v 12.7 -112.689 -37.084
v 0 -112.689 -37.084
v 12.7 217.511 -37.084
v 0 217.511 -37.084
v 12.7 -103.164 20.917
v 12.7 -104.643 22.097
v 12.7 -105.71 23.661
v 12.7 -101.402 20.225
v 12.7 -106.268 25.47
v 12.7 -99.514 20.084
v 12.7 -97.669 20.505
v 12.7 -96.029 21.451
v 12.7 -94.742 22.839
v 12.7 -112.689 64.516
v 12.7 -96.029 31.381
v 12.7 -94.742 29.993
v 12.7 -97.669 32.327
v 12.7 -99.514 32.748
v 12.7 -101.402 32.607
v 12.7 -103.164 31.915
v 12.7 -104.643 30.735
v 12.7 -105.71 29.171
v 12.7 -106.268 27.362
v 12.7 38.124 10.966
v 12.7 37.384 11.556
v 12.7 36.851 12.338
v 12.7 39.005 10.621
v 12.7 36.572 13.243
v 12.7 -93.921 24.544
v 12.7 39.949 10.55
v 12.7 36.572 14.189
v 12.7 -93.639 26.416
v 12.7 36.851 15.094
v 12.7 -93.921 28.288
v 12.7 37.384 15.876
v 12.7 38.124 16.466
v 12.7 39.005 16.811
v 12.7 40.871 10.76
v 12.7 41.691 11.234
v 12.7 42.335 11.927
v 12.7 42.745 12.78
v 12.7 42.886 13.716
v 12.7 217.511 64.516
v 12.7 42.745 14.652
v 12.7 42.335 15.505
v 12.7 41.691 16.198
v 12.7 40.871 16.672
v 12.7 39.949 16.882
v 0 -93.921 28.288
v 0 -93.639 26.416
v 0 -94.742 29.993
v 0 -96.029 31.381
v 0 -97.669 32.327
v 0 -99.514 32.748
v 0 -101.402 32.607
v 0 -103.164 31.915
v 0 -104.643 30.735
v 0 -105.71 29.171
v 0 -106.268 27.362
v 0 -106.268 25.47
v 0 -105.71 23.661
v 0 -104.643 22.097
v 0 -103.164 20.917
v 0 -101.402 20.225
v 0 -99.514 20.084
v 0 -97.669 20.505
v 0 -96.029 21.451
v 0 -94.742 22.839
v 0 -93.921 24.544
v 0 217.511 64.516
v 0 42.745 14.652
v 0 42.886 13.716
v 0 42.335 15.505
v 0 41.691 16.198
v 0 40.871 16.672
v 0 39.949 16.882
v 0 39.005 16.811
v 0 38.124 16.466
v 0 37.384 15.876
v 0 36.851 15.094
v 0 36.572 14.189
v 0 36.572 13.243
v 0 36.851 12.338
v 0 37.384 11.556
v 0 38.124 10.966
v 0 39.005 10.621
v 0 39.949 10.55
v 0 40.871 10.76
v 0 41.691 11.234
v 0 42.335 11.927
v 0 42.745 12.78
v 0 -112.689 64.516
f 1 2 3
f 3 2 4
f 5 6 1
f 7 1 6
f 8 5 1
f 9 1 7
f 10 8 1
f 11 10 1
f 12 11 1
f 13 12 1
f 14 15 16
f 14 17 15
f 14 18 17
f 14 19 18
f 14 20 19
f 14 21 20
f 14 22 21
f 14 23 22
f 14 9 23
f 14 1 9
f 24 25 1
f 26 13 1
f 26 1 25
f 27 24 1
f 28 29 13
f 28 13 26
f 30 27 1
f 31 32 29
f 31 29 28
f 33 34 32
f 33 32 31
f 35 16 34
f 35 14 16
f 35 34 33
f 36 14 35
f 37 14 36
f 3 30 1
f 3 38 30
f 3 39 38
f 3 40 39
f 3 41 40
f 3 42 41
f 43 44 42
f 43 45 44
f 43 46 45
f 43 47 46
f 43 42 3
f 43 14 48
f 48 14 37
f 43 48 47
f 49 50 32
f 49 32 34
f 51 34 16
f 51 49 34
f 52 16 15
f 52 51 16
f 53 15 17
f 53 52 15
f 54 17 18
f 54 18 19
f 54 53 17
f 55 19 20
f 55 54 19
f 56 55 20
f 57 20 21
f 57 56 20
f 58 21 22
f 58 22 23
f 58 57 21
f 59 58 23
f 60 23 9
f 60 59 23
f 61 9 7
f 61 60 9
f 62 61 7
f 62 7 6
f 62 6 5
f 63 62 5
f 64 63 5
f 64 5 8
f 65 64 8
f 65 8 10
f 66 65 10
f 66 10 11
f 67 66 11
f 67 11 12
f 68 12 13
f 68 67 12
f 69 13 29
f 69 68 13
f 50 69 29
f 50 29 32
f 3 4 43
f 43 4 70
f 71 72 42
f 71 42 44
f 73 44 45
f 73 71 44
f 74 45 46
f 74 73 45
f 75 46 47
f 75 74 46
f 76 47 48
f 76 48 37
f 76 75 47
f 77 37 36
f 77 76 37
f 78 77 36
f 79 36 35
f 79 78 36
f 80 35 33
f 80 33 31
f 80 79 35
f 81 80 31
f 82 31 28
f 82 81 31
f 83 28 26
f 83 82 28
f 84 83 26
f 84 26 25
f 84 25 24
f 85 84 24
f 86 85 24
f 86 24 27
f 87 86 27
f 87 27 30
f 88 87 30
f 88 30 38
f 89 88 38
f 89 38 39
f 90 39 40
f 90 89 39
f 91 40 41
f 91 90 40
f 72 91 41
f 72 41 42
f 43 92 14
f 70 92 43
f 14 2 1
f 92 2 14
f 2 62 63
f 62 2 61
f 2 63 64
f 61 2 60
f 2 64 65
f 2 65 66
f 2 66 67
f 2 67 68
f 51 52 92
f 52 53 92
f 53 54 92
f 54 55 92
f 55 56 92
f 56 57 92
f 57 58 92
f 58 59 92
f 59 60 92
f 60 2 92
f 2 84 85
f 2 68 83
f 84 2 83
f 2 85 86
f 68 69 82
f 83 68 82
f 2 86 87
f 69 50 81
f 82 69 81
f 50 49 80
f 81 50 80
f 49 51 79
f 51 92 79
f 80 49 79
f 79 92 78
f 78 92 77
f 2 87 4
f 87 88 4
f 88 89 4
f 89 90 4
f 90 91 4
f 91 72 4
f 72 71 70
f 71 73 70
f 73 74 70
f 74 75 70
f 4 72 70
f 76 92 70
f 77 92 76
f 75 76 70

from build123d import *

# Parameters (mm, degrees)
F0_W     = 330.2
F0_H     = 101.6
F0_R     = 6.35
F0_R_2   = 3.175
F1_DEPTH = 12.7


with BuildPart() as f1:
    # F0 (on Right) → F1 (new body)
    with BuildSketch(Plane.YZ):
        with Locations((52.411457, 13.716)):
            Rectangle(F0_W, F0_H)
        with Locations((-99.988543, 26.416)):
            Circle(F0_R, mode=Mode.SUBTRACT)
        with Locations((39.711457, 13.716)):
            Circle(F0_R_2, mode=Mode.SUBTRACT)
    extrude(amount=F1_DEPTH)


solid = f1.part
